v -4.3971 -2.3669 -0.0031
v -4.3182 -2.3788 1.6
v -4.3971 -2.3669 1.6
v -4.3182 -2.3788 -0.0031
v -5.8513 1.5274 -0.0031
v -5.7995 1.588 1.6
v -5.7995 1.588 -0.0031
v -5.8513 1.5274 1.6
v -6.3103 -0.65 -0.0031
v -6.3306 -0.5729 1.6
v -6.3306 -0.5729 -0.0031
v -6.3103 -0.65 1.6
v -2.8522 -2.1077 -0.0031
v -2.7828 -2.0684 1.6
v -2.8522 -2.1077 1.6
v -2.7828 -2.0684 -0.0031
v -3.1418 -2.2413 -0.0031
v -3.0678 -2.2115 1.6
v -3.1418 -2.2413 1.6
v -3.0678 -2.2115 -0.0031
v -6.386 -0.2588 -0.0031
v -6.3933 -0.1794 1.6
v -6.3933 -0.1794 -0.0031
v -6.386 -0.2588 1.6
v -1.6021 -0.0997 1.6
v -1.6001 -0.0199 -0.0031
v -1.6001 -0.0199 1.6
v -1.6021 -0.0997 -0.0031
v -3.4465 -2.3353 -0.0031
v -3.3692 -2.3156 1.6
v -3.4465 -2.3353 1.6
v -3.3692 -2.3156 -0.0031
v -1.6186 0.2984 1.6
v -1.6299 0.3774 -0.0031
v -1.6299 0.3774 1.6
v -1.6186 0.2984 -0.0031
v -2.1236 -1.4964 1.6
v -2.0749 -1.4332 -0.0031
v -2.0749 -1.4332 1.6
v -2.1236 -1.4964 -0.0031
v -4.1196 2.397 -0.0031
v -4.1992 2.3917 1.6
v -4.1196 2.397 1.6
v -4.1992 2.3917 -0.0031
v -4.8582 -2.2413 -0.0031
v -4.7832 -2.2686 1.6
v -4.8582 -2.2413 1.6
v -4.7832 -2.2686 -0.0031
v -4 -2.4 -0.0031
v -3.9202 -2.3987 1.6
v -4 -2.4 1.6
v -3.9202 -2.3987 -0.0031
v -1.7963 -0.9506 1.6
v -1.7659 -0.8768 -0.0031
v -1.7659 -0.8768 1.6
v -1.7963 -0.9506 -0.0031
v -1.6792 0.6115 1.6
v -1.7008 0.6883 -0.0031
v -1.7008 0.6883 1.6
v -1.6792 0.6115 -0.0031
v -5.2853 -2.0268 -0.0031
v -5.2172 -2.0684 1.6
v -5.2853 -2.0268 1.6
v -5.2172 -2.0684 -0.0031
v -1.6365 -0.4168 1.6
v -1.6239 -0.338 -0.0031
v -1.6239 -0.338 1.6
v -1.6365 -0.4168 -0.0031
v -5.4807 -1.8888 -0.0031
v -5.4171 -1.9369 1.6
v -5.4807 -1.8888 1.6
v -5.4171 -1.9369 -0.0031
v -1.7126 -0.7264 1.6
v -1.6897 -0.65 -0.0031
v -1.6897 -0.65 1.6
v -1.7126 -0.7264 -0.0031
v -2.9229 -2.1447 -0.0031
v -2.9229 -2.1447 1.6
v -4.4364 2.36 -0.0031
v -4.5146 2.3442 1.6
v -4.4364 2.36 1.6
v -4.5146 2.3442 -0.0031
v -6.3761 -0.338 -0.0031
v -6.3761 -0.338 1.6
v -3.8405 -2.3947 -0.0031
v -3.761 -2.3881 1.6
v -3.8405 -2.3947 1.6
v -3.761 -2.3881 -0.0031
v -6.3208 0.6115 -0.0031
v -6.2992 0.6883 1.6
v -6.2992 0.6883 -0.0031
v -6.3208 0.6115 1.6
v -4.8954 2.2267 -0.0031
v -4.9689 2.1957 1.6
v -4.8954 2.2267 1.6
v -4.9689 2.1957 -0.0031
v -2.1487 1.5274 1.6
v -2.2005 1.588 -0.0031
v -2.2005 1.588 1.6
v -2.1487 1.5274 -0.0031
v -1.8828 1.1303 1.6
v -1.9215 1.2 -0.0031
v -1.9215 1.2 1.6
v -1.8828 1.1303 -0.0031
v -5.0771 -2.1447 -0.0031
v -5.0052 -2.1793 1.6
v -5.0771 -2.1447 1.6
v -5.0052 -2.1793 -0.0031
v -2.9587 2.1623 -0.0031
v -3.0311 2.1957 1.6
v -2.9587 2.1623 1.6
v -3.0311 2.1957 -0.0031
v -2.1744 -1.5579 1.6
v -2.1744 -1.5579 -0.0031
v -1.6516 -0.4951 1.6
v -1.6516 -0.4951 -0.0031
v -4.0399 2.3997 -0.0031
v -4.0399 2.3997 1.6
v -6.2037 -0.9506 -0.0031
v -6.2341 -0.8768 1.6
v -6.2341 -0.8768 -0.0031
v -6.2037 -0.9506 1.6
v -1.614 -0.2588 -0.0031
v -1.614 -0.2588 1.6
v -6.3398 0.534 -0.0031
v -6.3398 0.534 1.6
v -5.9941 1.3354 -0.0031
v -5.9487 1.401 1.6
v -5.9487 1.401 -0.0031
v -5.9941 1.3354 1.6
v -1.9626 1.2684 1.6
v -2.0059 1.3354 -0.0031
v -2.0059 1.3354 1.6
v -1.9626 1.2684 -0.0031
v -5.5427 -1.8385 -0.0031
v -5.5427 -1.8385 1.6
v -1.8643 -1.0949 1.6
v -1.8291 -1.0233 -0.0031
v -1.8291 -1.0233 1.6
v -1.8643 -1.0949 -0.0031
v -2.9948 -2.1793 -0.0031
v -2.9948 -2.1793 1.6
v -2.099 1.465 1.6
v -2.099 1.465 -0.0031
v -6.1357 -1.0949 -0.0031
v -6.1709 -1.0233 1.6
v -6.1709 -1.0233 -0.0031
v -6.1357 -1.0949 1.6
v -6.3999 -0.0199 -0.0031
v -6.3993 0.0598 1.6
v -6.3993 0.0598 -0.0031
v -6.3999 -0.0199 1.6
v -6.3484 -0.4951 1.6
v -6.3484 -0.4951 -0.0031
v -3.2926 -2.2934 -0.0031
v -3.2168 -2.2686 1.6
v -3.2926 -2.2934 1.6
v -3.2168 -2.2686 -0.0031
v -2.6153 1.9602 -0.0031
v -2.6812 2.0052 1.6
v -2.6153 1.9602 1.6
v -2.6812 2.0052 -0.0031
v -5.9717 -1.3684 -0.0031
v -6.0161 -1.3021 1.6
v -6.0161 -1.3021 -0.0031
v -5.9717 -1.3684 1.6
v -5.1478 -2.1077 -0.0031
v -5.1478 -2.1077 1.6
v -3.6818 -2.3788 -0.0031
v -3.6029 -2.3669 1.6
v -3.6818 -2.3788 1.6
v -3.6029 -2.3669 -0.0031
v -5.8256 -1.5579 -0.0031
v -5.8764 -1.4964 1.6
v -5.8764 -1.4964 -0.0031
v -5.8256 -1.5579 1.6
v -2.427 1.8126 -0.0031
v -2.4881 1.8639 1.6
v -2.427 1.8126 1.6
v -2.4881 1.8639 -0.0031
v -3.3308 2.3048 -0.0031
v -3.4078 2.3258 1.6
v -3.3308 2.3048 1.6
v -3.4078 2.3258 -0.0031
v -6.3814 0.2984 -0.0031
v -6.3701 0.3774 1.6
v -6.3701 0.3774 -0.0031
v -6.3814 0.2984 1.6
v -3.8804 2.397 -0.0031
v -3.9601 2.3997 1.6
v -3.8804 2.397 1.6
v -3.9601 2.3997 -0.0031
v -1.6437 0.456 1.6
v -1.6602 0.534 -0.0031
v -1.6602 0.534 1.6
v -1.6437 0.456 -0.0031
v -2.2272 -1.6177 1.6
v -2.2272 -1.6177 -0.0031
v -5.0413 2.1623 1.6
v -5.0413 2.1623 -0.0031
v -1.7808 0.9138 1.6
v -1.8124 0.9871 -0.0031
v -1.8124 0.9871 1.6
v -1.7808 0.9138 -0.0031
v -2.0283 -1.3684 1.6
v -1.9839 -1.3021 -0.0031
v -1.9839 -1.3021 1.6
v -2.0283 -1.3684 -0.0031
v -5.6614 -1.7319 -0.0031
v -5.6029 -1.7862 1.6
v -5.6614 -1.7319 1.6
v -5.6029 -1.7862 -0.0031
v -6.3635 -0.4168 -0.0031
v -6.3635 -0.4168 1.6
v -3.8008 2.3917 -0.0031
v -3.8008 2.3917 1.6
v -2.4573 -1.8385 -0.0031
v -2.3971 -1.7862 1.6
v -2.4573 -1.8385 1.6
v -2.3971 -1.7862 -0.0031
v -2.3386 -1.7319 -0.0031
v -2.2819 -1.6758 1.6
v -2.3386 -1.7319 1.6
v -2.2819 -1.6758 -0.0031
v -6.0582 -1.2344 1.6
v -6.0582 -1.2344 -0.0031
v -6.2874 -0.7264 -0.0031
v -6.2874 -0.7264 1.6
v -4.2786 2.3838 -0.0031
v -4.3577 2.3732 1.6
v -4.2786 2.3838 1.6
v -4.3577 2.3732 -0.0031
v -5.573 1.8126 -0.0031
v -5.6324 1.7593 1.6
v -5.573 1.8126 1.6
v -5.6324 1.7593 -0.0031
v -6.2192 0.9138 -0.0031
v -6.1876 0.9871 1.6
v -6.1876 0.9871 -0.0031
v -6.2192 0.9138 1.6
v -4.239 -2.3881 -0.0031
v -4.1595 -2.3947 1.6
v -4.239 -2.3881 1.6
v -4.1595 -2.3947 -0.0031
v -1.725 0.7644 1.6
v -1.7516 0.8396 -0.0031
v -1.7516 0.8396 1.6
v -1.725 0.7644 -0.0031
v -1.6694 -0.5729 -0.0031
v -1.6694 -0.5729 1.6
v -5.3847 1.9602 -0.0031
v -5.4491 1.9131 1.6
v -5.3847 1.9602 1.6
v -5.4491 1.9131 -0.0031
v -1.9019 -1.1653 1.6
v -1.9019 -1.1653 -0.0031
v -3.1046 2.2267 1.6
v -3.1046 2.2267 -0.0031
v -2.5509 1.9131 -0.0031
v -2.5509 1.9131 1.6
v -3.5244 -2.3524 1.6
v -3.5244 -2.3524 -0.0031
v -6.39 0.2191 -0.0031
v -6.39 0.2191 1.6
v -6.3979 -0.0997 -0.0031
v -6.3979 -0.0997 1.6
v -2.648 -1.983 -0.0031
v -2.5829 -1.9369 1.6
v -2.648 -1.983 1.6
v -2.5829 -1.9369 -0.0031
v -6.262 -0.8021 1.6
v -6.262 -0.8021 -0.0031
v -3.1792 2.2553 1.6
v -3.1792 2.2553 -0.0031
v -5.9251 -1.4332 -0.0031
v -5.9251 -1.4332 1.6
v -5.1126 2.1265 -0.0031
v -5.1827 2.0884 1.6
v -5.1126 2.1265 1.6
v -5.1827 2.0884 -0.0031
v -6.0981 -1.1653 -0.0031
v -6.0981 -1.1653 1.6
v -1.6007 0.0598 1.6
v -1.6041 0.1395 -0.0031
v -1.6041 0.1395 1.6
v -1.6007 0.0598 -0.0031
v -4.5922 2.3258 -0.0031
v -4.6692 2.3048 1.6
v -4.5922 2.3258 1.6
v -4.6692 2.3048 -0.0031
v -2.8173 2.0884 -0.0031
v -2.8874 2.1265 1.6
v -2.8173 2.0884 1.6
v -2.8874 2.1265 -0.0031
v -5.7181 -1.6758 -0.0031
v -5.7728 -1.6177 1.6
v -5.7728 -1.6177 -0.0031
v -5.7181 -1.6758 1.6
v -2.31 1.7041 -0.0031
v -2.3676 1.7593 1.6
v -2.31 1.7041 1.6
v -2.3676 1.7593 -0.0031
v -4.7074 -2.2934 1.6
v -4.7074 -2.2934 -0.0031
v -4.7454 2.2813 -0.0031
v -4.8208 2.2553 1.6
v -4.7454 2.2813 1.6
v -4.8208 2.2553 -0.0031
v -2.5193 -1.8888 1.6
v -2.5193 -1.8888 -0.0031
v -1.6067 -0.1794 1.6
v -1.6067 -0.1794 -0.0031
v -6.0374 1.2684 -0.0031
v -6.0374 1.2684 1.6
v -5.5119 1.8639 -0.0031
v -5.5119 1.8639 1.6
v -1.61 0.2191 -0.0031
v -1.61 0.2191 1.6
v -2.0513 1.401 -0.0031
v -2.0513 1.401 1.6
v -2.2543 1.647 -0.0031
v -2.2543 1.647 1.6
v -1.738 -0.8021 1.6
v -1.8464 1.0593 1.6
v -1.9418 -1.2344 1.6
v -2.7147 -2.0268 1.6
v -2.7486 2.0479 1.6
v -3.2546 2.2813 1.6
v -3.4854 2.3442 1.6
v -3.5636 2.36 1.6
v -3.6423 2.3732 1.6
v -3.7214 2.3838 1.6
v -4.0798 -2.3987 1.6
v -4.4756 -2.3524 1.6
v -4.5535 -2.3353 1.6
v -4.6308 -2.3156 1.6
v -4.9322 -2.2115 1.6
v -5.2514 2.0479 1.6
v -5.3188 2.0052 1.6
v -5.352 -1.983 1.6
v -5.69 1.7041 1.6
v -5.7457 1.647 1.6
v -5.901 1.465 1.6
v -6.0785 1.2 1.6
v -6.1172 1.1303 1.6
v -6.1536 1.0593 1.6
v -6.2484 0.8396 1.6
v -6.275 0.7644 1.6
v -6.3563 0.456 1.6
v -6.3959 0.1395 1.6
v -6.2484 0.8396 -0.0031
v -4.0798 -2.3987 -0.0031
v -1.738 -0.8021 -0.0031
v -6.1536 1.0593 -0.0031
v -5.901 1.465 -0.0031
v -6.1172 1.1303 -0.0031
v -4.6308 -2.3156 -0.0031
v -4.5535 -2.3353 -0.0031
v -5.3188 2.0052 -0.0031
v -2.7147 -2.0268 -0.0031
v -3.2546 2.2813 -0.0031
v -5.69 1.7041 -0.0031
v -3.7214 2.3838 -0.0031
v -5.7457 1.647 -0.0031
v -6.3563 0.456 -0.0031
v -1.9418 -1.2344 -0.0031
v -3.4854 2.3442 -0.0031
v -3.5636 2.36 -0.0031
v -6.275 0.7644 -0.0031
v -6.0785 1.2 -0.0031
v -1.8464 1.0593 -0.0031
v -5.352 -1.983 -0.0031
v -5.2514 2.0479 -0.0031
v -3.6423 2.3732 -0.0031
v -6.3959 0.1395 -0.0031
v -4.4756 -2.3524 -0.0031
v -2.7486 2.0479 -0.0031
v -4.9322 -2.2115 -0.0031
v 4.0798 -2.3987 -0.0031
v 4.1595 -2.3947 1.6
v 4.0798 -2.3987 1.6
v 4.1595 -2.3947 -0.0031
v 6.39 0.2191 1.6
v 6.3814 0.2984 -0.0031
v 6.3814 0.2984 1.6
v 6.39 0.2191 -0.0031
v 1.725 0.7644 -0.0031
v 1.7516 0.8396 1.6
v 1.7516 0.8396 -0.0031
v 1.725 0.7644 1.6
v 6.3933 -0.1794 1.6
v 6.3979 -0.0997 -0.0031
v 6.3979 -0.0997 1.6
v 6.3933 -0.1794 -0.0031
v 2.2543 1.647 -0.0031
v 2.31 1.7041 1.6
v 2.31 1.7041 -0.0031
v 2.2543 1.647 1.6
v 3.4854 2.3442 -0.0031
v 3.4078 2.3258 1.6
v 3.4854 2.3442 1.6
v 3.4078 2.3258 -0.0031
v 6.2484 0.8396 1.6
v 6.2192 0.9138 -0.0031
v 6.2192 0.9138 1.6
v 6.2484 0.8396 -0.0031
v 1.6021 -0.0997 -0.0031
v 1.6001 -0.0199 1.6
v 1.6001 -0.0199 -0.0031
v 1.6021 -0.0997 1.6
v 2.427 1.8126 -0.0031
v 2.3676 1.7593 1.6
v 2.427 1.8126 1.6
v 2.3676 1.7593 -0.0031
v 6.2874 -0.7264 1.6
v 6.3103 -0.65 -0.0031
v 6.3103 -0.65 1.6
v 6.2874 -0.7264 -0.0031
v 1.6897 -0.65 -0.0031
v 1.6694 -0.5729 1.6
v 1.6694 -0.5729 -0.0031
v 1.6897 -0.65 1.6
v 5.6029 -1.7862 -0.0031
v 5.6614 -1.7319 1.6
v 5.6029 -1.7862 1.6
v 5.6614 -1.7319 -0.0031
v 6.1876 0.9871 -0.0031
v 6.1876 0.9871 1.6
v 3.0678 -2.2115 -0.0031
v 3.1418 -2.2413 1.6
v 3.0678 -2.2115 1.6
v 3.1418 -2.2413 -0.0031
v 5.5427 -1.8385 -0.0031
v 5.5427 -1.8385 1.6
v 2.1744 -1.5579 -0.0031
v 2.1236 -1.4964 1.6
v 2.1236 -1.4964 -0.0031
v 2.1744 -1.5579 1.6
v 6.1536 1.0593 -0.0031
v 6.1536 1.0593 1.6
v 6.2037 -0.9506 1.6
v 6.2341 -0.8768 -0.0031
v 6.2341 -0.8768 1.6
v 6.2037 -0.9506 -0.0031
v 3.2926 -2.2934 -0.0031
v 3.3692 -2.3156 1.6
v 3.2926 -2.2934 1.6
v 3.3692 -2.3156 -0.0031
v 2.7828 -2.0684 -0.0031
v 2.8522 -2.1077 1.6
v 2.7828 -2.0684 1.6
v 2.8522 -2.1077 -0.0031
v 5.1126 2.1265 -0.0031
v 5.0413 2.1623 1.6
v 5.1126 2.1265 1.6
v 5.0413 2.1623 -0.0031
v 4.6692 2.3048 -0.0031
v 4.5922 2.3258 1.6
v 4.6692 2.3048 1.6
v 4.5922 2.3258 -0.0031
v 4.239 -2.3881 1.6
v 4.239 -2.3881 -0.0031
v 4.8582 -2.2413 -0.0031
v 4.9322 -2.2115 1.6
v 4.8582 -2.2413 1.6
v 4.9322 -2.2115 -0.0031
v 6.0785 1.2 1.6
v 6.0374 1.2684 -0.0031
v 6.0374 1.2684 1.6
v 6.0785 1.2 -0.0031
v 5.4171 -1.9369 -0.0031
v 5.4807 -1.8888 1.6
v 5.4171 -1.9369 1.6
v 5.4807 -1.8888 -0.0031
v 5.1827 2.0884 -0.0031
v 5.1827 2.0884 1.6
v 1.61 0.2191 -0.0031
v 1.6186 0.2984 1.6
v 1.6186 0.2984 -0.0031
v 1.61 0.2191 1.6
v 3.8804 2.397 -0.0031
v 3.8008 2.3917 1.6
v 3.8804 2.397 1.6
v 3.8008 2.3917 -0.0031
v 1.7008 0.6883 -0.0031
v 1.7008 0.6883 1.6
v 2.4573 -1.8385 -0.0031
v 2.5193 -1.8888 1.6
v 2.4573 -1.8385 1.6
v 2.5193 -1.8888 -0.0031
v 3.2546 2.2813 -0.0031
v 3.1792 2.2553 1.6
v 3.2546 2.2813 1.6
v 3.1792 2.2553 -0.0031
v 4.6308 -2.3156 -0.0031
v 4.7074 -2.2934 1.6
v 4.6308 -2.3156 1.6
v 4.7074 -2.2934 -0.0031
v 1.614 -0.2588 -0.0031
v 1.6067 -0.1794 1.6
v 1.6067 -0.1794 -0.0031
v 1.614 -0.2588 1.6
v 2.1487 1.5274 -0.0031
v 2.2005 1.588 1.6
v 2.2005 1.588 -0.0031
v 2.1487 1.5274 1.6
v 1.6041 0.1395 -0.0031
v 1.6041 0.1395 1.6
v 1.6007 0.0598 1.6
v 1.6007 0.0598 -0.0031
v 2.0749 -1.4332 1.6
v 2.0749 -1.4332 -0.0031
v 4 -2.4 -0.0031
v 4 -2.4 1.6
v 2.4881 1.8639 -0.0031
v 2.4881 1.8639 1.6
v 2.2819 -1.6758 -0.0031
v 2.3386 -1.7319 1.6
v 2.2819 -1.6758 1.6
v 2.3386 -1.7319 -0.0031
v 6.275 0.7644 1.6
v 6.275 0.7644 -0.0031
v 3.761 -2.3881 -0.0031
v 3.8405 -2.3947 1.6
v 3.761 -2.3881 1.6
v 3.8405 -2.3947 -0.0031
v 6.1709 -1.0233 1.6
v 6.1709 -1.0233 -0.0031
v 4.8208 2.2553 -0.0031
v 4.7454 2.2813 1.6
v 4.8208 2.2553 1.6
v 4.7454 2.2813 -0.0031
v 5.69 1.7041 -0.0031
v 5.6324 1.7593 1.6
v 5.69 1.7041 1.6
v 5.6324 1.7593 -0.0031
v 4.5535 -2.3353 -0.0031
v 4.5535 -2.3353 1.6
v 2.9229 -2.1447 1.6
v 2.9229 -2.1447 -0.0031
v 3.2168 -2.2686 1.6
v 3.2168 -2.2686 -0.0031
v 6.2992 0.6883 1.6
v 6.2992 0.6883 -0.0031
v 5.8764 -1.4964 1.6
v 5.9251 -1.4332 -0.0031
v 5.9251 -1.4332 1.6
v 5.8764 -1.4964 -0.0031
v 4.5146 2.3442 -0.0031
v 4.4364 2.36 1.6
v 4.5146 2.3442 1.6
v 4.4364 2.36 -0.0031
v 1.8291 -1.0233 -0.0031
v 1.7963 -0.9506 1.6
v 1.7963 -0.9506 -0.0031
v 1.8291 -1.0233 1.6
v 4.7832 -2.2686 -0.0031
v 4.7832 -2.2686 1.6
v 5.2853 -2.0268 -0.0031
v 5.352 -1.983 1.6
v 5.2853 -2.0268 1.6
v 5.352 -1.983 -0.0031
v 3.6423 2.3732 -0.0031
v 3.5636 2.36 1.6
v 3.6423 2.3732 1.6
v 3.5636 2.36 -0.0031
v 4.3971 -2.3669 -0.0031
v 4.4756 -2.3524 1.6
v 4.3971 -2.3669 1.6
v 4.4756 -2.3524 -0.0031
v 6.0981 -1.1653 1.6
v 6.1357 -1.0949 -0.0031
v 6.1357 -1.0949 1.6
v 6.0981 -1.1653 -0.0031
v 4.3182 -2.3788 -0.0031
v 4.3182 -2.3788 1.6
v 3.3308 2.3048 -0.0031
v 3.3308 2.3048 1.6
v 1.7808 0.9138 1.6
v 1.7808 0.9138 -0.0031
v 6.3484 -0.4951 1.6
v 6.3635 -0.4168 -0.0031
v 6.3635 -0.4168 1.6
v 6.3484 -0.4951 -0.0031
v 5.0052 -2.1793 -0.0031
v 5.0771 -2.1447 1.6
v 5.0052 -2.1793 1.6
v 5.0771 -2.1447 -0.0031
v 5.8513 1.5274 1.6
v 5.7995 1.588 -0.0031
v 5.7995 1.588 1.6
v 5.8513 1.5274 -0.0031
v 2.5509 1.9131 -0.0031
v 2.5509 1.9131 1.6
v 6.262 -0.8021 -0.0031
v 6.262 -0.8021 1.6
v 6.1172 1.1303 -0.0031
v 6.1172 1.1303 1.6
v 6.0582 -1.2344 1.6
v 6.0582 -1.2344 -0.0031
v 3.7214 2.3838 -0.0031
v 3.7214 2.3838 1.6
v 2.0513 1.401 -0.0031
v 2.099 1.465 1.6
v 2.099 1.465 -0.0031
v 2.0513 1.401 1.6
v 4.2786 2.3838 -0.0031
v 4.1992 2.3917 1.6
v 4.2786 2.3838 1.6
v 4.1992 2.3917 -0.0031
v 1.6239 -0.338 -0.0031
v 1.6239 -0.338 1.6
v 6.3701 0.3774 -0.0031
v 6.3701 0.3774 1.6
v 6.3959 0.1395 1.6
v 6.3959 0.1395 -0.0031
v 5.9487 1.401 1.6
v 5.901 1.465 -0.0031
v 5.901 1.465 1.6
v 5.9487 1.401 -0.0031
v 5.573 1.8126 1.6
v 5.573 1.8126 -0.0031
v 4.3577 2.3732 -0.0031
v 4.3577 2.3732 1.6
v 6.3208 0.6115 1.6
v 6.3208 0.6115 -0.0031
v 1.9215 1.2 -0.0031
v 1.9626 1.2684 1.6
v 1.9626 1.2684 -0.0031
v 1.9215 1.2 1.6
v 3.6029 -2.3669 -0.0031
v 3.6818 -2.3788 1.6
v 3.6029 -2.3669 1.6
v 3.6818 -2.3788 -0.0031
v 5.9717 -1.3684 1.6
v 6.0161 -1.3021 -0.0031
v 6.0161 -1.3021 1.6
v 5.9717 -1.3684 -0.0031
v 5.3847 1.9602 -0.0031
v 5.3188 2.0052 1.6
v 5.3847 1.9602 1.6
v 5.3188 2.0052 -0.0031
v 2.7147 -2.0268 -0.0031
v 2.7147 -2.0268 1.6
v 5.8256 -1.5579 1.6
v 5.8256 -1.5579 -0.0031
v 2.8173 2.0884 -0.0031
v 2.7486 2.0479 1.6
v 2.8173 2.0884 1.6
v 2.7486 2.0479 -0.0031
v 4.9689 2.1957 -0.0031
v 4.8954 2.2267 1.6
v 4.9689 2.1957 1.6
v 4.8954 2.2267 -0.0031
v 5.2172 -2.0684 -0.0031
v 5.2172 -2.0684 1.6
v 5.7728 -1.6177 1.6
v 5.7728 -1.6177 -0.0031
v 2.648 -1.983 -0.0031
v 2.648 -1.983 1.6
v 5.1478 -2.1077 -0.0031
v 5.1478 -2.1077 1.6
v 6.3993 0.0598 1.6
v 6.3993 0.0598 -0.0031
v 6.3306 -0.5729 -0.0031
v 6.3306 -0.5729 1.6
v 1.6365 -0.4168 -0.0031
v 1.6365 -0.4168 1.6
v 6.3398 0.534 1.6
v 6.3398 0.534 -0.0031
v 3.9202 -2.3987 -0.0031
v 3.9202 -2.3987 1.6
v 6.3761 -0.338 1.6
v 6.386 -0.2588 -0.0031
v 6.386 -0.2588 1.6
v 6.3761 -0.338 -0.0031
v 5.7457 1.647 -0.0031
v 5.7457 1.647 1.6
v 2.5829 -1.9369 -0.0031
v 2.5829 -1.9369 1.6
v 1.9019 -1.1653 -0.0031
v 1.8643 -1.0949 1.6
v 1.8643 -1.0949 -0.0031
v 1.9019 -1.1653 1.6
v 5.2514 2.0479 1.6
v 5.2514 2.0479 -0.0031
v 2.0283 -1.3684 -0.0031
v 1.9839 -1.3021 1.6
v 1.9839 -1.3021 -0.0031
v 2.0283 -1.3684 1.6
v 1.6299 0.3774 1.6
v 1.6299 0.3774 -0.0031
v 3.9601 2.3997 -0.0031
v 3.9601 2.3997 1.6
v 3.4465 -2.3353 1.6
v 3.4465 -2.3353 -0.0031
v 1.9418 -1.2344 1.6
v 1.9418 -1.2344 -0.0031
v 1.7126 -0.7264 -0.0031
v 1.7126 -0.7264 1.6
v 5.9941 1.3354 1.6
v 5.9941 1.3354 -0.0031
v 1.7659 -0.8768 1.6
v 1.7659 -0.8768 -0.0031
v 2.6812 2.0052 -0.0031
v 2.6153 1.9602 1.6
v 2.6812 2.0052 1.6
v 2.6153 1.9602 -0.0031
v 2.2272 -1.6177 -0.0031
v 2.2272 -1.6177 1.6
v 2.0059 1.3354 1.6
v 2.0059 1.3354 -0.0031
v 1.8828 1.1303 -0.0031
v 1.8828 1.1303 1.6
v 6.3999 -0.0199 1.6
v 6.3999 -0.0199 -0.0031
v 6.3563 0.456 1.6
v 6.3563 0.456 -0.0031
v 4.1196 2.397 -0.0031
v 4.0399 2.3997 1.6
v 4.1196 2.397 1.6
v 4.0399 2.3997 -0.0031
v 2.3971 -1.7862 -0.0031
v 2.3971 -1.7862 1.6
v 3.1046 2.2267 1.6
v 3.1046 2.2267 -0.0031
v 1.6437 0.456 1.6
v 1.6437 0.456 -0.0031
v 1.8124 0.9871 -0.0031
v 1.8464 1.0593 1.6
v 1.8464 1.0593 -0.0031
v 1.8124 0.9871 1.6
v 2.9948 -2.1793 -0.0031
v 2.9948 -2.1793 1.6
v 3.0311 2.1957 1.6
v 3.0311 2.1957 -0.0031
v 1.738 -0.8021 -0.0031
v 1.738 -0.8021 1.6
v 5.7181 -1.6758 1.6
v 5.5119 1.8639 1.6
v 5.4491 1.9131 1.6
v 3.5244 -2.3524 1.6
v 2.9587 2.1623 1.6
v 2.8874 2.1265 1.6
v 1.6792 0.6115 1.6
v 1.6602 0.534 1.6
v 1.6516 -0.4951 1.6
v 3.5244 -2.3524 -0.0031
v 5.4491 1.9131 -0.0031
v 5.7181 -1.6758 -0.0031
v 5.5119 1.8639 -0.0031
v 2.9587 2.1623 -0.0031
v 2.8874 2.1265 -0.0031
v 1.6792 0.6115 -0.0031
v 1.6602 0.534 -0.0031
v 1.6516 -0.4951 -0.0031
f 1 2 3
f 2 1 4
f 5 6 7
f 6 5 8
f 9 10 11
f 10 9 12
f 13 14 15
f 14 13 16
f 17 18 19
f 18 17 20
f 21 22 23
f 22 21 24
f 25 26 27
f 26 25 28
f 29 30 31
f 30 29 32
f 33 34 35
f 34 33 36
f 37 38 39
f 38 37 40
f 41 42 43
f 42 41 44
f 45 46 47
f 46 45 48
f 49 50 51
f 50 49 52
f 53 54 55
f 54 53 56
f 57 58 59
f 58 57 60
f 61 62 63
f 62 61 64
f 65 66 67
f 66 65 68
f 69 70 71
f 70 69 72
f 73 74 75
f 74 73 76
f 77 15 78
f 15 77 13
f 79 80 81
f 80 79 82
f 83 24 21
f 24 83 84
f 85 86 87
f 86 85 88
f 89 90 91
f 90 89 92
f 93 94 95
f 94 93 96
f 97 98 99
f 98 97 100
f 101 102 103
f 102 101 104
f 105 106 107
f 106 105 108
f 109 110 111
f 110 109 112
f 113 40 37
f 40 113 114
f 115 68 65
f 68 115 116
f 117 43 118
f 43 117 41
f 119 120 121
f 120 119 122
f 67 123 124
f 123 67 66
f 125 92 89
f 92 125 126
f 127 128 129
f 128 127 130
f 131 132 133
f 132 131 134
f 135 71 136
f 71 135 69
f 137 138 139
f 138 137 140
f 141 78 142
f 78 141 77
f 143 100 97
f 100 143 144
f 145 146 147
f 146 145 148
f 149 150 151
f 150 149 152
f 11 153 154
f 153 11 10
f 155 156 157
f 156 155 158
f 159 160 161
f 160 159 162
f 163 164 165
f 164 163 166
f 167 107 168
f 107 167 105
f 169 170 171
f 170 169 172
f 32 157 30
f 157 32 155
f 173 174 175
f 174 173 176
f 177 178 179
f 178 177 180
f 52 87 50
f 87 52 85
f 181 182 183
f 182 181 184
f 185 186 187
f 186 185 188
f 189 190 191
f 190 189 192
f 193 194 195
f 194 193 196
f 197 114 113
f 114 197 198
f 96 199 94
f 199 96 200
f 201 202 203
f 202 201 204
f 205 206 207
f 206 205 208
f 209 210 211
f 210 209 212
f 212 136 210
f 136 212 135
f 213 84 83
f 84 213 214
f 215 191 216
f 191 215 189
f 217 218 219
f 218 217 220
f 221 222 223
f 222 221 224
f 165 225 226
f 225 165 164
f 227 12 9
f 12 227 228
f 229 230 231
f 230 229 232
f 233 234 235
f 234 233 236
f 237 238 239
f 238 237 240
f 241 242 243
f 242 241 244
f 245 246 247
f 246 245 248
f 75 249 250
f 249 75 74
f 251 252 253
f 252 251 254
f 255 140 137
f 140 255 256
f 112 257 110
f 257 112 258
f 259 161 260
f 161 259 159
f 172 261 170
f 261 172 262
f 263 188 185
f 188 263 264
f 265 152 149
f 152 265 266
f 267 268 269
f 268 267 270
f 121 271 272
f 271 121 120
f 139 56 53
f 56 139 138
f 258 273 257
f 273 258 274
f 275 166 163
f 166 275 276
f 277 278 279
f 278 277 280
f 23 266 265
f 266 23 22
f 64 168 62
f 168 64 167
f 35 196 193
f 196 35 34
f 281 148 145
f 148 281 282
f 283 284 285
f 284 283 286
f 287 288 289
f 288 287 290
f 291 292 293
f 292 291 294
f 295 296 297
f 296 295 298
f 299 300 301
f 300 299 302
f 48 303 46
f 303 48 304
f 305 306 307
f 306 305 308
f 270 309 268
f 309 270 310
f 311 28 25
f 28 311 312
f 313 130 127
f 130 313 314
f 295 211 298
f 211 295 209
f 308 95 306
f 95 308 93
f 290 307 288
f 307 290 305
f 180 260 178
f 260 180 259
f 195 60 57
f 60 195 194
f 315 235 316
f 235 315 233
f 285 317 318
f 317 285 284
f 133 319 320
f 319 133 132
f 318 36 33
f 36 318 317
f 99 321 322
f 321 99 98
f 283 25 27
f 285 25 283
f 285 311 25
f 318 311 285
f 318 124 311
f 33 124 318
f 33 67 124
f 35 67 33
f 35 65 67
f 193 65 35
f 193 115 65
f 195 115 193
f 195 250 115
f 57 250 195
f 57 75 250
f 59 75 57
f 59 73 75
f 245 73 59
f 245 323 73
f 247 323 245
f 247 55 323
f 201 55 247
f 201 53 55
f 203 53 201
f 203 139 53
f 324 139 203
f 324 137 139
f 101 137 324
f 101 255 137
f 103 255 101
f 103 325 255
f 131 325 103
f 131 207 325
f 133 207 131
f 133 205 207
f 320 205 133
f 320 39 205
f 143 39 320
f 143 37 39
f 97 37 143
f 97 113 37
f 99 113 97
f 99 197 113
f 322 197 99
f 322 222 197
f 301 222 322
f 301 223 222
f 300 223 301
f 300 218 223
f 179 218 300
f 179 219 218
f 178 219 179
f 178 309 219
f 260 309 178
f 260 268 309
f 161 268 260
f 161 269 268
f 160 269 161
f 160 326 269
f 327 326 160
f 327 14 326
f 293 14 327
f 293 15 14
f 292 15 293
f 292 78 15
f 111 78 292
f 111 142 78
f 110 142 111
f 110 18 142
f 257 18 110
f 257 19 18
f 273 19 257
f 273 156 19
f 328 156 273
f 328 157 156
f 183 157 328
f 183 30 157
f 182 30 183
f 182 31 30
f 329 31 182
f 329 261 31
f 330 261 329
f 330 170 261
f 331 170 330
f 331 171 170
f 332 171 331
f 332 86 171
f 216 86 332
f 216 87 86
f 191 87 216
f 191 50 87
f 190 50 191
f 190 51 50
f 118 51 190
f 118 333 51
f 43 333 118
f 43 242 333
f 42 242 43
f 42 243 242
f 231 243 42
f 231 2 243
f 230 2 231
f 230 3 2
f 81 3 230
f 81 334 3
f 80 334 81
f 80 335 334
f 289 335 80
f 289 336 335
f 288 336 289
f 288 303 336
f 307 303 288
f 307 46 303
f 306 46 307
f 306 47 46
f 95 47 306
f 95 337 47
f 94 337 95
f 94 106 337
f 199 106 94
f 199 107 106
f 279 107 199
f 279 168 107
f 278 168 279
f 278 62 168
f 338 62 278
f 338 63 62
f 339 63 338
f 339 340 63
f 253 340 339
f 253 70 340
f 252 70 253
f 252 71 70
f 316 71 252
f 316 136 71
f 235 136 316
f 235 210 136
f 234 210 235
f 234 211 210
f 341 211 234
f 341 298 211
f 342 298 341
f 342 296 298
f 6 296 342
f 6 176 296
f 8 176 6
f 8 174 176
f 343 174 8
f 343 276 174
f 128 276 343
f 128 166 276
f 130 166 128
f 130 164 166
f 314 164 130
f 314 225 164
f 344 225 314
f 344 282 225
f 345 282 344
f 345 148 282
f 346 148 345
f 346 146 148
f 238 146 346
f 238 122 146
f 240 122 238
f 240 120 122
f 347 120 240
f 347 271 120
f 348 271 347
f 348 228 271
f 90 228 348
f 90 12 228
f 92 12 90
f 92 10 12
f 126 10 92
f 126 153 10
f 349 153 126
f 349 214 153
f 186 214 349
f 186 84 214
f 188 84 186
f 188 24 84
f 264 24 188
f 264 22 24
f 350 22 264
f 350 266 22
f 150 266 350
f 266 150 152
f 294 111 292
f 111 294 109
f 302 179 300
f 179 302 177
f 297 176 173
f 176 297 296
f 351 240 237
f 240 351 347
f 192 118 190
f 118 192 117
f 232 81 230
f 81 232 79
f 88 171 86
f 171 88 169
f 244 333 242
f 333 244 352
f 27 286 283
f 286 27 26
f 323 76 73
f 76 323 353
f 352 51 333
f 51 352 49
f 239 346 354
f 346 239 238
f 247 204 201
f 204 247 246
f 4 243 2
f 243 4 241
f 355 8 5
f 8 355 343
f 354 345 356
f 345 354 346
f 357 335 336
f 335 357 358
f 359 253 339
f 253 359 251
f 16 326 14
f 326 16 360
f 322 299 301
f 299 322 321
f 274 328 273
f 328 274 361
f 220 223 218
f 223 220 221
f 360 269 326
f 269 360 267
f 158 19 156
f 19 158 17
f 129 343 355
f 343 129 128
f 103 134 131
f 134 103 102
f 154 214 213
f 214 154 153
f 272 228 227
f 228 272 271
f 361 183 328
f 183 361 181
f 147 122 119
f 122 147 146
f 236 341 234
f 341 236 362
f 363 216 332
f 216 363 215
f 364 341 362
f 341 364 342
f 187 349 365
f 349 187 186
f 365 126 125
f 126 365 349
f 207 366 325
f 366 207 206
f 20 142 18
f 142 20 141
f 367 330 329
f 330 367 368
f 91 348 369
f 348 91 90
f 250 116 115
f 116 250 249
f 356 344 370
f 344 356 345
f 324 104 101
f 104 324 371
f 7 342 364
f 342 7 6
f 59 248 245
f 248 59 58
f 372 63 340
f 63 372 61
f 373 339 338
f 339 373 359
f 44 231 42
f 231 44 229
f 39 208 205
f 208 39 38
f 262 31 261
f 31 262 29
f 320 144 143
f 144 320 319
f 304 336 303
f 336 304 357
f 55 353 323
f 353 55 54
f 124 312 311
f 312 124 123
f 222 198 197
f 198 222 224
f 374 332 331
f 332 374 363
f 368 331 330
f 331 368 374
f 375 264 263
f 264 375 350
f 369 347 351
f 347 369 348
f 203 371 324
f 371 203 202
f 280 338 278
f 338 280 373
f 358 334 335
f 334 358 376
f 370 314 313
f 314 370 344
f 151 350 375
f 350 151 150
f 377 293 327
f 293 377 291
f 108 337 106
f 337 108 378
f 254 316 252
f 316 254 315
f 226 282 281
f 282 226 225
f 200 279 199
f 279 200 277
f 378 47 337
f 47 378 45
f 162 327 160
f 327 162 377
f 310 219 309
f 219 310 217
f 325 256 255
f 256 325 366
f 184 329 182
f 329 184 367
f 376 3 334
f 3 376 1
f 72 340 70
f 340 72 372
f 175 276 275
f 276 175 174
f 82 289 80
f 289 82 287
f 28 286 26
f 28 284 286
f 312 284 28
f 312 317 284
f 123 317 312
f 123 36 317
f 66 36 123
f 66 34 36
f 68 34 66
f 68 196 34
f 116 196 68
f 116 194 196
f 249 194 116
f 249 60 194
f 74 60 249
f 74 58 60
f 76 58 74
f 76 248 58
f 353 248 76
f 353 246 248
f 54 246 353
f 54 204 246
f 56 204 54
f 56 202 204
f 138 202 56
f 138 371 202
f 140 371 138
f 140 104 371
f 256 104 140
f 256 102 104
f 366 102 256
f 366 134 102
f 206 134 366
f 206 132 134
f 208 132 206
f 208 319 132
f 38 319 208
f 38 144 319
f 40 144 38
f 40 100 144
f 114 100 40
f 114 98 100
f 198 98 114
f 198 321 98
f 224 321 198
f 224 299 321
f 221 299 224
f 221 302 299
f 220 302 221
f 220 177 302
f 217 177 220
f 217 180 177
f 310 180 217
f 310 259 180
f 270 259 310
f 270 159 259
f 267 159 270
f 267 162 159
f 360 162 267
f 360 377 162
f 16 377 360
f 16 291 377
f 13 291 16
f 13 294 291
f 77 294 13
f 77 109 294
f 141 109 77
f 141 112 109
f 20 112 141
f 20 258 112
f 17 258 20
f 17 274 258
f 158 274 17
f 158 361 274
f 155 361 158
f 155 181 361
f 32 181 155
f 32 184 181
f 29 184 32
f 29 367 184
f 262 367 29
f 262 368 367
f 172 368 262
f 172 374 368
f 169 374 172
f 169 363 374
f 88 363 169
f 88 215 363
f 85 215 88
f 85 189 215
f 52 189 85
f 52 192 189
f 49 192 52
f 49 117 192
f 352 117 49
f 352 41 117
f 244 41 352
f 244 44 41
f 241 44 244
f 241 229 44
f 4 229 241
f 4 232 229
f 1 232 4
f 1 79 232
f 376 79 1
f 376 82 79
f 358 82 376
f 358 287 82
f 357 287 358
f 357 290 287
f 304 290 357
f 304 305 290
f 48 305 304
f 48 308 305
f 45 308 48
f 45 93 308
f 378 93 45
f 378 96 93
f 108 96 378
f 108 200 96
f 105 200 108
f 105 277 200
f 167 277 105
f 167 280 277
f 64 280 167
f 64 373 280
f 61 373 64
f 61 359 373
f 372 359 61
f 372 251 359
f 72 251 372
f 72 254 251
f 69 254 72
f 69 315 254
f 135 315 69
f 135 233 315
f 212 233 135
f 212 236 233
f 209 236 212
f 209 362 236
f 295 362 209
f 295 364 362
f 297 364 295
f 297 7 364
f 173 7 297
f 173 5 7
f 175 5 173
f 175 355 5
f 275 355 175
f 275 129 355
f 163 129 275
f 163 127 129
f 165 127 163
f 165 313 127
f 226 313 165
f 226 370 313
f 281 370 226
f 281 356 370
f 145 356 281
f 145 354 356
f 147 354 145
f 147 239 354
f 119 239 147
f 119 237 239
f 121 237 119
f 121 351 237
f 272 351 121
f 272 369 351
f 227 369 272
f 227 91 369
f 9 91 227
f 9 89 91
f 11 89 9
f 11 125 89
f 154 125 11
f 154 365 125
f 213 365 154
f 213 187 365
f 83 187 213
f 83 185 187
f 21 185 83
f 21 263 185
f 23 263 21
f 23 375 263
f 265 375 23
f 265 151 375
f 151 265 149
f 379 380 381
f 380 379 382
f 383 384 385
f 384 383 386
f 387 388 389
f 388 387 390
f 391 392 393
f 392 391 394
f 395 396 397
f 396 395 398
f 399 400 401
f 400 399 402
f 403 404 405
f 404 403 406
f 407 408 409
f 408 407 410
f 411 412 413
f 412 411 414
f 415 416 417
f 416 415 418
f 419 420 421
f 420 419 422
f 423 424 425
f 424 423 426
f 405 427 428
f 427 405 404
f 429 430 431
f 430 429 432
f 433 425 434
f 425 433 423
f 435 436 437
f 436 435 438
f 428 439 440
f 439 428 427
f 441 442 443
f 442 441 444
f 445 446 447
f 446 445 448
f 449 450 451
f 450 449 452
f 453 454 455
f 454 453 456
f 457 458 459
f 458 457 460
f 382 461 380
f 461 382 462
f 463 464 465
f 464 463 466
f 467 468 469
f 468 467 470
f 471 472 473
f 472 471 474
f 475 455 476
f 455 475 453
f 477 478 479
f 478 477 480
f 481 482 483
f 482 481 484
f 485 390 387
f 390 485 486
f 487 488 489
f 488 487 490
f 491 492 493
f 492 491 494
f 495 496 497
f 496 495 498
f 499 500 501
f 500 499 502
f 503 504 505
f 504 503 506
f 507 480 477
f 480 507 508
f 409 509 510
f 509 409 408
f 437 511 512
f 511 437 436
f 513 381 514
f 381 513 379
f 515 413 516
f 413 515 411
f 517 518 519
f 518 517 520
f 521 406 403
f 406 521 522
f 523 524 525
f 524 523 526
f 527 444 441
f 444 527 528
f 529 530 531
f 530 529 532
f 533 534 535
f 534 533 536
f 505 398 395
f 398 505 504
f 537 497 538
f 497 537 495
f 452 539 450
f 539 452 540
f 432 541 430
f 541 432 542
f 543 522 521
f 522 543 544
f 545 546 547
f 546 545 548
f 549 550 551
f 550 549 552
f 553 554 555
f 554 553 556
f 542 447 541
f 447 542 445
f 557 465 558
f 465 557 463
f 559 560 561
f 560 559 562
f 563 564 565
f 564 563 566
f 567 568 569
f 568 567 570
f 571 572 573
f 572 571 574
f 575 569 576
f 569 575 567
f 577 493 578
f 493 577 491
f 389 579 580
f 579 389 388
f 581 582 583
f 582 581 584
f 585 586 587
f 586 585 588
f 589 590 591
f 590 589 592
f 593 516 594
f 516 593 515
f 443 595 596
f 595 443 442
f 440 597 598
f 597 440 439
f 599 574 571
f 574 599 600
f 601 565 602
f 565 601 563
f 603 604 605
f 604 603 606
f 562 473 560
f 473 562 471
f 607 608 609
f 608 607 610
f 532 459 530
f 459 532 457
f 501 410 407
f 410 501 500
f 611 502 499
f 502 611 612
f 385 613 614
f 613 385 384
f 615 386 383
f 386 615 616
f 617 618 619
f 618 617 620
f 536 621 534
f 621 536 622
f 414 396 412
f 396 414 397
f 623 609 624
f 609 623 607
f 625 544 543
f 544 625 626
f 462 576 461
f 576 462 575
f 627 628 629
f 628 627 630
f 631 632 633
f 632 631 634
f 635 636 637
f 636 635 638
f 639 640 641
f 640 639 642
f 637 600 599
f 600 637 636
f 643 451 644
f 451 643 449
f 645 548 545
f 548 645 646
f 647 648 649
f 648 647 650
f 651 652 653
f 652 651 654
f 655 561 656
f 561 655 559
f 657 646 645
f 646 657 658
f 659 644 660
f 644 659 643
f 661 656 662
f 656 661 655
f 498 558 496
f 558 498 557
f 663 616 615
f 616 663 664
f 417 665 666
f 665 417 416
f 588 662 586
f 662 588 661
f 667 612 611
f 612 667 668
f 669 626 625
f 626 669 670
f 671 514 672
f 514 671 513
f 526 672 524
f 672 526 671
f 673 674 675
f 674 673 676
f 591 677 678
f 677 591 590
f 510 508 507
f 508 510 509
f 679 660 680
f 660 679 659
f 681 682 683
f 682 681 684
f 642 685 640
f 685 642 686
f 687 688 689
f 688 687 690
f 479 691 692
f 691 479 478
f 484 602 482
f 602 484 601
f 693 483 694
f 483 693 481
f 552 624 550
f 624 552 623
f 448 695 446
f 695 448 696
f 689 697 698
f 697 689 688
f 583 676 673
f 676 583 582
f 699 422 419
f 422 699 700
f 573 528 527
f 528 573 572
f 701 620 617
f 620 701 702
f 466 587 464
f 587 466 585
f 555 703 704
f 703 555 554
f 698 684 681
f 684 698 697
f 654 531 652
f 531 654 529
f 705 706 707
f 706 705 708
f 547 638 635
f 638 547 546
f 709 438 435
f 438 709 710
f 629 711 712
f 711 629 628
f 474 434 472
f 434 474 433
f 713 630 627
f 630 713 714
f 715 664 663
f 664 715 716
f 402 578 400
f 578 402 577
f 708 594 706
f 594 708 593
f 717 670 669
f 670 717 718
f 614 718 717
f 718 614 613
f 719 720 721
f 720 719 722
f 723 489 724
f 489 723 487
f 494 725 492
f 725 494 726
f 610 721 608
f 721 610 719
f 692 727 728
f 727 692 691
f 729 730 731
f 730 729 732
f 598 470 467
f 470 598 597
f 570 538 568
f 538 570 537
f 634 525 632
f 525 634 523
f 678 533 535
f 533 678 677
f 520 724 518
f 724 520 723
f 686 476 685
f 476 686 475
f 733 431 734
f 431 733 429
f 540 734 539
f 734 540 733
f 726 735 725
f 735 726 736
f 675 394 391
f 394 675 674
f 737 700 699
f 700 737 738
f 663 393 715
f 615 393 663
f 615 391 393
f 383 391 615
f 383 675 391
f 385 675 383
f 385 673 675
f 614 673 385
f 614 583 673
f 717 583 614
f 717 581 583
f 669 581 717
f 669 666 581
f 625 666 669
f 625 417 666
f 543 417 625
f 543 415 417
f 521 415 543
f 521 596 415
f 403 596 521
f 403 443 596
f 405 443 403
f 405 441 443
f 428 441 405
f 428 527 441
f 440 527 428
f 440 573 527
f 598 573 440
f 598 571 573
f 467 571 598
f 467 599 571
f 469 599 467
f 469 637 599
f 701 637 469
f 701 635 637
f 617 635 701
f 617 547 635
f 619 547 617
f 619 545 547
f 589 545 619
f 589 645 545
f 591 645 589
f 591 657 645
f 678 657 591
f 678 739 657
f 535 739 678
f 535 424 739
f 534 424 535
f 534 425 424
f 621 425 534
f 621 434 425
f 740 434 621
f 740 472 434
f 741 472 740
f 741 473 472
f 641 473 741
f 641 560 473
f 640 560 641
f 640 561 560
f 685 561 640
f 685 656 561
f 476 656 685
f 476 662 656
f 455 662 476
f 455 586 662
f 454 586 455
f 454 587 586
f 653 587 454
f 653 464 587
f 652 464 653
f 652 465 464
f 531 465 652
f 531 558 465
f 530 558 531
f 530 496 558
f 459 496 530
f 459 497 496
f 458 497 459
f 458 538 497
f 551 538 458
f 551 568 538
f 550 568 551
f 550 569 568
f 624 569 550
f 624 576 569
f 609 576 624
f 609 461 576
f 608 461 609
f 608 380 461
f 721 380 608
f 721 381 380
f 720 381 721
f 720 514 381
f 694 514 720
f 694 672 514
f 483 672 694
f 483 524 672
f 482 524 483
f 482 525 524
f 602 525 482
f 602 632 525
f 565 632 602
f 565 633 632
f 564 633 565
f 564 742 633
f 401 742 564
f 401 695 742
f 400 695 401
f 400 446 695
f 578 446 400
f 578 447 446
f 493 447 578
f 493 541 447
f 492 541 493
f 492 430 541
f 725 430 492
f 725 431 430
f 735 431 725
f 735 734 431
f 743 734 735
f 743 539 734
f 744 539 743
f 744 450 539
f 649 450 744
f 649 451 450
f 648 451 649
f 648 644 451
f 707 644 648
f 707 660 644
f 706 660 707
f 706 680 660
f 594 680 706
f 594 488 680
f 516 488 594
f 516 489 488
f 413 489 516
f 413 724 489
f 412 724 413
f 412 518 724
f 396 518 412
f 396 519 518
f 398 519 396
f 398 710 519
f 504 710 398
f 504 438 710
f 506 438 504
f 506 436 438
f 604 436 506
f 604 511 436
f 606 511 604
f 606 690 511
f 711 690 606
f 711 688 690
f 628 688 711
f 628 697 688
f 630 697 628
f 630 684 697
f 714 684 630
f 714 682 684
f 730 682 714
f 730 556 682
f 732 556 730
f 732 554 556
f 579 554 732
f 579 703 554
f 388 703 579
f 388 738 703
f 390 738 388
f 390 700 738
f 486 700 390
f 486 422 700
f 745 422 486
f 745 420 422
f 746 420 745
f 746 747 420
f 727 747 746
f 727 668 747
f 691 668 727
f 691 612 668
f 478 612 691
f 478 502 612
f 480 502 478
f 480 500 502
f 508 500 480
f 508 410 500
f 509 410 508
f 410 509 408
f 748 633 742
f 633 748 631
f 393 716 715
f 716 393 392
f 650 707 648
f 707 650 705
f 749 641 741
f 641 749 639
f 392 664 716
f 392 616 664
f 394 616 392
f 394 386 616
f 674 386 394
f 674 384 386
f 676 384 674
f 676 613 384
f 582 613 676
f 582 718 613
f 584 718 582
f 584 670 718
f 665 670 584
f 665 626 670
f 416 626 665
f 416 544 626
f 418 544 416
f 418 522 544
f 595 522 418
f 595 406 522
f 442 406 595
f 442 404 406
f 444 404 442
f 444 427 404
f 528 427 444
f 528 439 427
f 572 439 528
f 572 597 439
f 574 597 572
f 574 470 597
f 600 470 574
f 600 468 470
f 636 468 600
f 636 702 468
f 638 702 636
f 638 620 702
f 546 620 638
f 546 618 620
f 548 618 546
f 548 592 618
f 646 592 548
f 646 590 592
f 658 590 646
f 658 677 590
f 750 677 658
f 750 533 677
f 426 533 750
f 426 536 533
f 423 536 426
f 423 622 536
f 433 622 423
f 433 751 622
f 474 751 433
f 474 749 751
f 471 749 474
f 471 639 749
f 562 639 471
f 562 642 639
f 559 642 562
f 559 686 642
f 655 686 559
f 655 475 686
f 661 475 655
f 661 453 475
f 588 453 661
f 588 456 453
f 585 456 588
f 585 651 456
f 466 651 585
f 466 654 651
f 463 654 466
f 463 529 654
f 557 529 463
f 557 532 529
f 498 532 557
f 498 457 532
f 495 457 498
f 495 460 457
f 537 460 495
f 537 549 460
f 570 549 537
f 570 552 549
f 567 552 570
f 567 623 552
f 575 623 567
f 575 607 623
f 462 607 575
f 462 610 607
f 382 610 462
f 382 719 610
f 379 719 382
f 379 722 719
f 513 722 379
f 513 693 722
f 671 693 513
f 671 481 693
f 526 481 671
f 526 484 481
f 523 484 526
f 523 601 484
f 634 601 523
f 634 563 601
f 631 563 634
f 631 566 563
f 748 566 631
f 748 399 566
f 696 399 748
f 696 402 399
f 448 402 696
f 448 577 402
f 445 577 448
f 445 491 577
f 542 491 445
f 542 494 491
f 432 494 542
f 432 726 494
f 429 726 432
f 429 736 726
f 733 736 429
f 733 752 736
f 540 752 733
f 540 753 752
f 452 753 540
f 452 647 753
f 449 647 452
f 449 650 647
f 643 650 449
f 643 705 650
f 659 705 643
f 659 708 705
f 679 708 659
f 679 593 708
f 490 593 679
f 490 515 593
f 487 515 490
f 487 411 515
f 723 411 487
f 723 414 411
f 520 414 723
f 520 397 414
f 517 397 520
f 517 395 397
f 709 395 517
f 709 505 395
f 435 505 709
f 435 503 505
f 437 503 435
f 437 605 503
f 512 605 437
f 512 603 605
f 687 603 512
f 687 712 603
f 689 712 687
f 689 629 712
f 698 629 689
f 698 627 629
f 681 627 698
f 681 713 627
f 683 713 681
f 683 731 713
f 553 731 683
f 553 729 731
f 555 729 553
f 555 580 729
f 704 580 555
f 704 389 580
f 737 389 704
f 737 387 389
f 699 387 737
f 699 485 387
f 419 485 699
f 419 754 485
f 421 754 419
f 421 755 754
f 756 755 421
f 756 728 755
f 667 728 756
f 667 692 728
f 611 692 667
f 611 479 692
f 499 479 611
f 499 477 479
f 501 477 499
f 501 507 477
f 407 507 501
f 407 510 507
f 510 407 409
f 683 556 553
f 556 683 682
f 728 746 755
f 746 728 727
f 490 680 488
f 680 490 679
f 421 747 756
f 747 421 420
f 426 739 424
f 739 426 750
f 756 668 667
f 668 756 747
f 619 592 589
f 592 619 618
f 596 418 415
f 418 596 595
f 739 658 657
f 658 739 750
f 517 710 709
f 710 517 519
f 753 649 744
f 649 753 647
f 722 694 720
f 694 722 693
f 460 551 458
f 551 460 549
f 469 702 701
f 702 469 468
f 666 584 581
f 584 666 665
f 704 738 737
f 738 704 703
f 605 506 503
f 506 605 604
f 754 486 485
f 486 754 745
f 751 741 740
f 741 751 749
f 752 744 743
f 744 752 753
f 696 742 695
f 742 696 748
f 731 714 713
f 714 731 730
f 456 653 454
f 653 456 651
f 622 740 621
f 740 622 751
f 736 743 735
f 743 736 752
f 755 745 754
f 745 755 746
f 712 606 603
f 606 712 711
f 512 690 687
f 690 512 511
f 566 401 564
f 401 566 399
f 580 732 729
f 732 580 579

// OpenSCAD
use <../lib.scad>
use <s/3298s01.scad>
$fa=1; $fs=0.2;
function ldraw_lib__3298p1a(realsolid=false) = [
// 0 Slope Brick 33  3 x  2 with Red V Pattern
// 0 Name: 3298p1a.dat
// 0 Author: Tore Eriksson [Tore_Eriksson]
// 0 !LDRAW_ORG Part UPDATE 2009-03
// 0 !LICENSE Licensed under CC BY 2.0 and CC BY 4.0 : see CAreadme.txt
// 
// 0 BFC CERTIFY CCW
  [0,"BFC","CERTIFY"],
  [0,"BFC","CCW"],
// 
// 0 !HISTORY 2009-12-29 [PTadmin] Official Update 2009-03
// 
// 
// 1 16 0 0 0 1 0 0 0 1 0 0 0 1 s\3298s01.dat
  [1,16,0,0,0,1,0,0,0,1,0,0,0,1, ldraw_lib__s__3298s01(realsolid)],
// 
// 4 16 20 0 -10 -20 0 -10 -18.5 1 -12 18.5 1 -12
  [4,16,20,0,-10,-20,0,-10,-18.5,1,-12,18.5,1,-12],
// 3 16 20 0 -10 18.5 1 -12 20 20 -50
  [3,16,20,0,-10,18.5,1,-12,20,20,-50],
// 3 16 18.5 1 -12 0 19 -48 20 20 -50
  [3,16,18.5,1,-12,0,19,-48,20,20,-50],
// 3 16 20 20 -50 0 19 -48 -20 20 -50
  [3,16,20,20,-50,0,19,-48,-20,20,-50],
// 3 16 -18.5 1 -12 -20 20 -50 0 19 -48
  [3,16,-18.5,1,-12,-20,20,-50,0,19,-48],
// 3 16 -20 0 -10 -20 20 -50 -18.5 1 -12
  [3,16,-20,0,-10,-20,20,-50,-18.5,1,-12],
// 
// 0 4 0 18.5 1 -12 -18.5 1 -12 -17.5 1.3 -12.6 17.5 1.3 -12.6
// 4 0 18.5 1 -12 7.5 1 -12 8.1 1.3 -12.6 17.5 1.3 -12.6
  [4,0,18.5,1,-12,7.5,1,-12,8.1,1.3,-12.6,17.5,1.3,-12.6],
// 4 0 8.1 1.3 -12.6 7.5 1 -12 0 18 -46 1.15 17 -44
  [4,0,8.1,1.3,-12.6,7.5,1,-12,0,18,-46,1.15,17,-44],
// 3 0 0 18 -46 0 19 -48 1.15 17 -44
  [3,0,0,18,-46,0,19,-48,1.15,17,-44],
// 4 0 0 19 -48 18.5 1 -12 17.5 1.3 -12.6 1.15 17 -44
  [4,0,0,19,-48,18.5,1,-12,17.5,1.3,-12.6,1.15,17,-44],
// 4 0 0 19 -48 -1.15 17 -44 -17.5 1.3 -12.6 -18.5 1 -12
  [4,0,0,19,-48,-1.15,17,-44,-17.5,1.3,-12.6,-18.5,1,-12],
// 3 0 0 18 -46 -1.15 17 -44 0 19 -48
  [3,0,0,18,-46,-1.15,17,-44,0,19,-48],
// 4 0 -8.1 1.3 -12.6 -1.15 17 -44 0 18 -46 -7.5 1 -12
  [4,0,-8.1,1.3,-12.6,-1.15,17,-44,0,18,-46,-7.5,1,-12],
// 4 0 -18.5 1 -12 -17.5 1.3 -12.6 -8.1 1.3 -12.6 -7.5 1 -12
  [4,0,-18.5,1,-12,-17.5,1.3,-12.6,-8.1,1.3,-12.6,-7.5,1,-12],
// 
// 3 4 17.5 1.3 -12.6 8.1 1.3 -12.6 1.15 17 -44
  [3,4,17.5,1.3,-12.6,8.1,1.3,-12.6,1.15,17,-44],
// 3 4 -17.5 1.3 -12.6 -1.15 17 -44 -8.1 1.3 -12.6
  [3,4,-17.5,1.3,-12.6,-1.15,17,-44,-8.1,1.3,-12.6],
// 
// 3 16 7.5 1 -12 -7.5 1 -12 0 18 -46
  [3,16,7.5,1,-12,-7.5,1,-12,0,18,-46],
// 0
];
module ldraw_lib__3298p1a(step=0, col=false, unit=2/5, alt=false, line=0.2, solid=!$preview)
    makepoly(ldraw_lib__3298p1a(solid), step=step, col=col, unit=unit, alt=alt, line=line, solid=solid);
ldraw_lib__3298p1a(line=0.2);
